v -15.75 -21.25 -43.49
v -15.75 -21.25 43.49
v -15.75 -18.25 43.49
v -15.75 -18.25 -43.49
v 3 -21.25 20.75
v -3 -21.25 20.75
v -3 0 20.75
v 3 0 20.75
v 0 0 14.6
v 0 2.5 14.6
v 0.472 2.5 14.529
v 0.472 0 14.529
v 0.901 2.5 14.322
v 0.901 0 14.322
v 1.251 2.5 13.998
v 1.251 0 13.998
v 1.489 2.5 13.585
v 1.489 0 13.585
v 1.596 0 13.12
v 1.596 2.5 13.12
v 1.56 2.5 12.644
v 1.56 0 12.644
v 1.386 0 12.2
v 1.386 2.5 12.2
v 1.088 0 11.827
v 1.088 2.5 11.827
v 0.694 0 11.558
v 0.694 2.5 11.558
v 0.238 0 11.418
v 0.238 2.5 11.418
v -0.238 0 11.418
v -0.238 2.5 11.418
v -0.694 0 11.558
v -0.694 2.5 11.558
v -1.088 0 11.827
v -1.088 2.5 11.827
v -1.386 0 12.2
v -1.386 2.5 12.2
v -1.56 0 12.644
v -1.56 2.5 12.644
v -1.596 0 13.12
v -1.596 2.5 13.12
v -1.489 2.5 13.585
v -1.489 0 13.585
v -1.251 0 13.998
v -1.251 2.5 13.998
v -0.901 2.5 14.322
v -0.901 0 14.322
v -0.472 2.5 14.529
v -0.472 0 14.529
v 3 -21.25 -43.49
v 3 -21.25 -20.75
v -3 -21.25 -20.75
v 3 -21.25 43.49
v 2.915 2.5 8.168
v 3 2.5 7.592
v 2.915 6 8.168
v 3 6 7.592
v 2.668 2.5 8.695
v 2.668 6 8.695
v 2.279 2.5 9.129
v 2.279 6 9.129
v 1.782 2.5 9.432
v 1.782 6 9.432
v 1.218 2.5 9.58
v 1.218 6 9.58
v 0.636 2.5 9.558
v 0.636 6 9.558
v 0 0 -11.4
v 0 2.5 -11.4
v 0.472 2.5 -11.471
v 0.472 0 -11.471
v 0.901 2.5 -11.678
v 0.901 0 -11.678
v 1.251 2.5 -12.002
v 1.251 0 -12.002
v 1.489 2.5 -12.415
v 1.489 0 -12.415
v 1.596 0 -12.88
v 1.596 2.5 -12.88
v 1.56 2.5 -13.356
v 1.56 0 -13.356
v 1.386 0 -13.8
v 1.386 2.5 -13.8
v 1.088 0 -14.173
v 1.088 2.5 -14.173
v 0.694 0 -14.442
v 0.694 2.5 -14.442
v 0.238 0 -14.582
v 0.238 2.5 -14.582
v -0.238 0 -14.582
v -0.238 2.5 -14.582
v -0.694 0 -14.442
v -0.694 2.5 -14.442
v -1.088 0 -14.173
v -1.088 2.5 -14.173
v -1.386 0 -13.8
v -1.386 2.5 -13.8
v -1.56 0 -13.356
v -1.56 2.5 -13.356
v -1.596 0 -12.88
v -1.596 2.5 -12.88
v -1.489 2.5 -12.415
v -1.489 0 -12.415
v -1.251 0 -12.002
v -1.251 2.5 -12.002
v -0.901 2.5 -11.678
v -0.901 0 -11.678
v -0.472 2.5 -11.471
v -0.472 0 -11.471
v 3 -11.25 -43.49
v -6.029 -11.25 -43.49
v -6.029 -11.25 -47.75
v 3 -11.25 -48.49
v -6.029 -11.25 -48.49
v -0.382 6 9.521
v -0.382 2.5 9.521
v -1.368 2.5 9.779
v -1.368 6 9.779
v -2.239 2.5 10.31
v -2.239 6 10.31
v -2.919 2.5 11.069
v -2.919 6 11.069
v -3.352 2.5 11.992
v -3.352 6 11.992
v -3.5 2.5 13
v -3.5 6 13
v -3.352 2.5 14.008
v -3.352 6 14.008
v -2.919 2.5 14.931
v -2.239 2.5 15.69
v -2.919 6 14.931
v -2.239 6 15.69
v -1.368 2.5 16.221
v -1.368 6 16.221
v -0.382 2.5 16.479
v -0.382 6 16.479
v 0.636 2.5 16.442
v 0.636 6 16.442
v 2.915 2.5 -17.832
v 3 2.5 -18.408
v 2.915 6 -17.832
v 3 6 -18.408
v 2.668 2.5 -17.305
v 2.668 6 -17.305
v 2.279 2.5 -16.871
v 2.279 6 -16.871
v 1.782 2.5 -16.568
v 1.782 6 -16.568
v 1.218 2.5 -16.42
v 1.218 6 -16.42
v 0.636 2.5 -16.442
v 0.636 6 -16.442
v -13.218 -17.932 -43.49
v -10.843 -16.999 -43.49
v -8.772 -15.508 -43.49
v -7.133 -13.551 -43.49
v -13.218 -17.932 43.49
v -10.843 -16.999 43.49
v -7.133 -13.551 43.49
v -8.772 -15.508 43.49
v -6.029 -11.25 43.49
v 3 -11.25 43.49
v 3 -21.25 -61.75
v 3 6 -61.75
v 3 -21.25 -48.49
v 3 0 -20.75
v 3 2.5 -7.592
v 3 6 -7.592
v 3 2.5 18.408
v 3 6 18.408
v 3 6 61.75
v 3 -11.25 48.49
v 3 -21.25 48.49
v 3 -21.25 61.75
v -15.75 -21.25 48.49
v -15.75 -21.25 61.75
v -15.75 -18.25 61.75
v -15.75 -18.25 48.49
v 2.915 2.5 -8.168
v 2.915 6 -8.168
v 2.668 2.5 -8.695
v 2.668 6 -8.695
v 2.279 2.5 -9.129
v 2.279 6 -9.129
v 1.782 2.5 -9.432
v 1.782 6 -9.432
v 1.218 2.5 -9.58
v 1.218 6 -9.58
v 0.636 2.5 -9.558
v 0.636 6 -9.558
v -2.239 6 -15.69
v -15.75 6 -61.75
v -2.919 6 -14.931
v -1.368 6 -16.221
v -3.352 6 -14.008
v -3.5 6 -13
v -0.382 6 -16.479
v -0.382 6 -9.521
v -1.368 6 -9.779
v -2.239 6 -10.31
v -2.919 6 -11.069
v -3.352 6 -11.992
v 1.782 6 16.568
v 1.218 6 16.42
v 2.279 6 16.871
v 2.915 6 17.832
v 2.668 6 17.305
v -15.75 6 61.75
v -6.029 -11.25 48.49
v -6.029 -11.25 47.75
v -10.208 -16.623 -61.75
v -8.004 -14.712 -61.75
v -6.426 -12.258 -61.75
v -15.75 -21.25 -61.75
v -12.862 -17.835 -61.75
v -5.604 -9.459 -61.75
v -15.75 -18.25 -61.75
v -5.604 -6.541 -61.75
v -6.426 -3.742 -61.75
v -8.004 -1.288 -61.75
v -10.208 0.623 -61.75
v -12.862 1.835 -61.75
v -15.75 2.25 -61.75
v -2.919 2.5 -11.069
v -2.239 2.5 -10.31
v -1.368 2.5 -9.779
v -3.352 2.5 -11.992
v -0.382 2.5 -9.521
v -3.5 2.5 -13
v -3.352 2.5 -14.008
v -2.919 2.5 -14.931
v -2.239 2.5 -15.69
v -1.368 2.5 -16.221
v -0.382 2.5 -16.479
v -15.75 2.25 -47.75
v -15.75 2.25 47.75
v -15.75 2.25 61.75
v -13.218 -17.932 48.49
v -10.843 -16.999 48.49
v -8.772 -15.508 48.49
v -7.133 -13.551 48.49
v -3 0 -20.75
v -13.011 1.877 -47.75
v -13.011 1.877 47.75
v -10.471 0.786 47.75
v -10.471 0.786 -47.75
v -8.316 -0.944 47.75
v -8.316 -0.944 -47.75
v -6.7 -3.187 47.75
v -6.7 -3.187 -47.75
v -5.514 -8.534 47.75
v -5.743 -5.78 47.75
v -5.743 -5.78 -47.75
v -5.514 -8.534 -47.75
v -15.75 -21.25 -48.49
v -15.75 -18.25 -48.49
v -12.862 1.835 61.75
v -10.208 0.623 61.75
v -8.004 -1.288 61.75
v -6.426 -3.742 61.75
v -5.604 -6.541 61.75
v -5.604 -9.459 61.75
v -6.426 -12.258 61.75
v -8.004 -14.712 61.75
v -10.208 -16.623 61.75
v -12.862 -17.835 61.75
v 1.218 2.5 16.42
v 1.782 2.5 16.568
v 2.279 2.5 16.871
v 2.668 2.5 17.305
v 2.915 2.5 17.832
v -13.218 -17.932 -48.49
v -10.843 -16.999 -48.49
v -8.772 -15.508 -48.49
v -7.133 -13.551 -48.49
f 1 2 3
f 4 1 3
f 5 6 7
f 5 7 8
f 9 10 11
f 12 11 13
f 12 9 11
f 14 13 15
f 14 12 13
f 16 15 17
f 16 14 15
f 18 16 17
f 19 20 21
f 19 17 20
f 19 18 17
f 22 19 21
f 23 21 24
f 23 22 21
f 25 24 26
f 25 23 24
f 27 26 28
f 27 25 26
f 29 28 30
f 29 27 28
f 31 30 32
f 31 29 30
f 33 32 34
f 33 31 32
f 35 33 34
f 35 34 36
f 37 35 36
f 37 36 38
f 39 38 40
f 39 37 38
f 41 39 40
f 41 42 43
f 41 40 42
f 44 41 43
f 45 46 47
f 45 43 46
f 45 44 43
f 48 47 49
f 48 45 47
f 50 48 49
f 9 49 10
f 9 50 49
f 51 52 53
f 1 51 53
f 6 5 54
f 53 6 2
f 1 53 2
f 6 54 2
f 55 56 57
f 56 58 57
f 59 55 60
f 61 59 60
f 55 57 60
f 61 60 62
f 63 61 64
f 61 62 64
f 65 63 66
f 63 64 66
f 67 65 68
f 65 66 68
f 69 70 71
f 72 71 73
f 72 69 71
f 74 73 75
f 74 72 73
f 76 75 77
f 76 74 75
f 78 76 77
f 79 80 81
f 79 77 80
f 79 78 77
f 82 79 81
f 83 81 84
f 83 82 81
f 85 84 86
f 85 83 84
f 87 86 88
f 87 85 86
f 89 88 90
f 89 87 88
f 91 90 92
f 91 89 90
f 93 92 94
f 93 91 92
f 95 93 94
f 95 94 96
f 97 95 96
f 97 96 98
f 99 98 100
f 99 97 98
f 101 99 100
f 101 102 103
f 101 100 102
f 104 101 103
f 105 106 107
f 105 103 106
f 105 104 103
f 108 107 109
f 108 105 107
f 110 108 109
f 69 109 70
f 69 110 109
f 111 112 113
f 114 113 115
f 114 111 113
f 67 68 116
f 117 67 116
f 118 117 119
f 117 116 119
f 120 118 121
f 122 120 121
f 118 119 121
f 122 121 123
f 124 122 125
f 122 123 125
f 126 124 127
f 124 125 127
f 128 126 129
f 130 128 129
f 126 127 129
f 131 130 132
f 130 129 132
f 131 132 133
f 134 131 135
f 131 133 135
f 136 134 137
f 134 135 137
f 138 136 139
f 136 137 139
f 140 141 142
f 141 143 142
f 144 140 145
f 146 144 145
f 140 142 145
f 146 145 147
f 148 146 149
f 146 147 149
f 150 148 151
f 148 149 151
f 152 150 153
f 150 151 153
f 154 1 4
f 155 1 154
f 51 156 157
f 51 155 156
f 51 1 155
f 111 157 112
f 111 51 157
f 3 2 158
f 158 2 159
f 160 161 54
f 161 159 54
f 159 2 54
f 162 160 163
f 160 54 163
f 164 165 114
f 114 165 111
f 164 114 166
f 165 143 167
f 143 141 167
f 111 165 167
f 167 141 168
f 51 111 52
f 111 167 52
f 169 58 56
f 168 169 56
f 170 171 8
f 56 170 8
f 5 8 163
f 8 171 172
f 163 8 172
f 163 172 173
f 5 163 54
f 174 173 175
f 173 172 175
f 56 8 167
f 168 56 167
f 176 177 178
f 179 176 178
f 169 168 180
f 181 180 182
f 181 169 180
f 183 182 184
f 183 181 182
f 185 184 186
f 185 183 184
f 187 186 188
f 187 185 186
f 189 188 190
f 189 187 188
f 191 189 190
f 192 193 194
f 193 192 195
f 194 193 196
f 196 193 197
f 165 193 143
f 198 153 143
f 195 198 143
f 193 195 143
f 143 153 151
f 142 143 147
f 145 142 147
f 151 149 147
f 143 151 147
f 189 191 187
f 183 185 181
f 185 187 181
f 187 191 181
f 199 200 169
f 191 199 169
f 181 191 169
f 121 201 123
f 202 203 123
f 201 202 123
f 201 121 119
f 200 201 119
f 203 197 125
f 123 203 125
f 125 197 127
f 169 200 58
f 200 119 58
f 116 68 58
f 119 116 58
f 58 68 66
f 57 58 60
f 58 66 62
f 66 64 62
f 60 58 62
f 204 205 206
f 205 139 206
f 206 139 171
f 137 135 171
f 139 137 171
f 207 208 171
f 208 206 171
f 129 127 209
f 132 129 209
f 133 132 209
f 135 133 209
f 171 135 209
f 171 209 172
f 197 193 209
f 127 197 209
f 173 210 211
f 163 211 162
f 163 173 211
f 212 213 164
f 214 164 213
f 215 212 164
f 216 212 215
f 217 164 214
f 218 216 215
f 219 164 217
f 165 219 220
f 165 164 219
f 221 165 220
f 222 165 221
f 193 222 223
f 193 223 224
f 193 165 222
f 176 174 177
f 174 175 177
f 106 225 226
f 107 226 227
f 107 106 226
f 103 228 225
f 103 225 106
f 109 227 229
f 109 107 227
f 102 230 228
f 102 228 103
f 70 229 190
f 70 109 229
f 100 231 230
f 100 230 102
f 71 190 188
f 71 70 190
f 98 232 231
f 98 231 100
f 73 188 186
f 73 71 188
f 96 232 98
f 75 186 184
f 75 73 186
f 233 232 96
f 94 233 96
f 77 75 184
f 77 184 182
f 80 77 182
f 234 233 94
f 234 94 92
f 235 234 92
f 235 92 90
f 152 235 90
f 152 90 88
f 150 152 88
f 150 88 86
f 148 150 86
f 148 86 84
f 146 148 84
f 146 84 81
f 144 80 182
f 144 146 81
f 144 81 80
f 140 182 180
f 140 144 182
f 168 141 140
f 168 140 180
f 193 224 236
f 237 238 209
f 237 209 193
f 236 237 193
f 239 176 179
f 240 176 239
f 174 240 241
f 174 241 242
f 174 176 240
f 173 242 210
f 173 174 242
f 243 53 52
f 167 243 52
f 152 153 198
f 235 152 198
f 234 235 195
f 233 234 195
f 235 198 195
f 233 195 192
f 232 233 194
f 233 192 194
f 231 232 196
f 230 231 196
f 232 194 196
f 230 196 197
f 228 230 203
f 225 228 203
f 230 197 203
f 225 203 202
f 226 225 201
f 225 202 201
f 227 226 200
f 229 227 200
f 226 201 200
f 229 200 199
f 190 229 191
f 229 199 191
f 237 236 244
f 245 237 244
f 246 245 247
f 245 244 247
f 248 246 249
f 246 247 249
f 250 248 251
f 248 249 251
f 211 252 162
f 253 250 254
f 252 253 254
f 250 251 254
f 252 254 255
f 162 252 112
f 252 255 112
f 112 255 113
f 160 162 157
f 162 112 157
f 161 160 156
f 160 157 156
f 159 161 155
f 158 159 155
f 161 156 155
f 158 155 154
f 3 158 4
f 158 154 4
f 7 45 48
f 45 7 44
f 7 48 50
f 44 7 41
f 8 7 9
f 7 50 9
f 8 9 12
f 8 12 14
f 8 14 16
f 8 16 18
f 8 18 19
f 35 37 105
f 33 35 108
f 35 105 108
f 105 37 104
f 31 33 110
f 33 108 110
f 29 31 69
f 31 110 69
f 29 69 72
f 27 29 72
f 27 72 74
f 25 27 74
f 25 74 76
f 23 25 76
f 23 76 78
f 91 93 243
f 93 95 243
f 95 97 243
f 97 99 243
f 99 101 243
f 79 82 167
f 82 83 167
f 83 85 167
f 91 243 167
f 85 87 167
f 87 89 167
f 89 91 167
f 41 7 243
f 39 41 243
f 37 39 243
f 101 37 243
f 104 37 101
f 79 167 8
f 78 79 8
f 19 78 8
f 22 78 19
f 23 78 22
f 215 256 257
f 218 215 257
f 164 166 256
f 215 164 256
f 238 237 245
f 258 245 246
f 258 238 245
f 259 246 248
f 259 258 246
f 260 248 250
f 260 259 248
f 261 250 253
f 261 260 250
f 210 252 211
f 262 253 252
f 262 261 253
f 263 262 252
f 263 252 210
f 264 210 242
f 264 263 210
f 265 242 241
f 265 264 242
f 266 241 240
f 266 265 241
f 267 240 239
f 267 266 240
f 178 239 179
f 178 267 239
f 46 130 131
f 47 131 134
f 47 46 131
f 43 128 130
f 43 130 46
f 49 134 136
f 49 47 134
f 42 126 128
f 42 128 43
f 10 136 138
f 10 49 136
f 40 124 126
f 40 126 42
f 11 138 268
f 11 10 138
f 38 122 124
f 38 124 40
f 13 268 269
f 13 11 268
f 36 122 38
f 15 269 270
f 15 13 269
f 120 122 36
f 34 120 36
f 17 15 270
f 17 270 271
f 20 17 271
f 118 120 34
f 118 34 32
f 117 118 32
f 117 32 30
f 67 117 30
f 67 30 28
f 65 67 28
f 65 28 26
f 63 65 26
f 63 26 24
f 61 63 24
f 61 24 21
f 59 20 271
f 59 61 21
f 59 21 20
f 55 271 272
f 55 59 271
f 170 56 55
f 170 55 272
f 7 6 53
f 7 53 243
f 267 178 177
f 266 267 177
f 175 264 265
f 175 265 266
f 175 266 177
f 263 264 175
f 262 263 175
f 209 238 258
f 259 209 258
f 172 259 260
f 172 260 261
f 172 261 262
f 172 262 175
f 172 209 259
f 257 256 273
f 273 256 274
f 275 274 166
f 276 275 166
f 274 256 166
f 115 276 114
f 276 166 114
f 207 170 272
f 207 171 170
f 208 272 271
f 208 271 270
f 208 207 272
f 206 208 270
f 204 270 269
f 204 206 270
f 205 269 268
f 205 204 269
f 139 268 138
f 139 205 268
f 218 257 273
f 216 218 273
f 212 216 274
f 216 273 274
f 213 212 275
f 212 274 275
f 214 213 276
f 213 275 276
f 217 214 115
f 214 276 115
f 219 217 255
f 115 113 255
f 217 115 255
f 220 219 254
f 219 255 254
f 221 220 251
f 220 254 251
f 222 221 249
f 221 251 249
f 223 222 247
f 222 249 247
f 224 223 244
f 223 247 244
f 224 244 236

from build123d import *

# Parameters (mm, degrees)
SKETCH_1_W          = 6
SKETCH_1_H          = 41.5
SKETCH_1_R          = 1.6
EXTRUDE_1_DEPTH     = 3
EXTRUDE_2_DEPTH     = 41.5
EXTRUDE_START       = 17
EXTRUDE_3_DEPTH     = 17
EXTRUDE_START_2     = 10
EXTRUDE_4_DEPTH     = 10
SKETCH_6_W          = 18.75
SKETCH_6_H          = 95.5
SKETCH_6_R          = 1.6
EXTRUDE_5_DEPTH     = 3
EXTRUDE_START_3     = 75.5
EXTRUDE_6_DEPTH     = 75.5
SKETCH_8_W          = 6
SKETCH_8_H          = 41.5
CUT_EXTRUDE_1_DEPTH = 53.193150892
SKETCH_9_R          = 3.5
CUT_EXTRUDE_2_DEPTH = 3.5
FILLET_1_R          = 2
EXTRUDE_START_4     = 14
EXTRUDE_7_DEPTH     = 14
EXTRUDE_8_DEPTH     = 14
SKETCH_12_W         = 5
SKETCH_12_H         = 10
CUT_EXTRUDE_3_DEPTH = 68.942530862


with BuildPart() as part:
    # 草图1 → 凸台-拉伸1 (new body)
    with BuildSketch(Plane(origin=(0, 0, 0), x_dir=(1, 0, 0), z_dir=(0, 1, 0))):
        Rectangle(SKETCH_1_W, SKETCH_1_H)
        with Locations(Location((0, 13, 0), (0, 0, 270))):
            Circle(SKETCH_1_R, mode=Mode.SUBTRACT)
        with Locations(Location((0, -13, 0), (0, 0, 270))):
            Circle(SKETCH_1_R, mode=Mode.SUBTRACT)
    extrude(amount=EXTRUDE_1_DEPTH)

    # 草图2 → 凸台-拉伸2 (add)
    with BuildSketch(Plane.XY.offset(20.75)):
        with BuildLine():
            ThreePointArc((-5.5, -8), (-8.502155493, -0.752155493), (-15.75, 2.25))
            Line((-15.75, 2.25), (-15.75, 3))
            Line((-15.75, 3), (-5.5, 3))
            Line((-5.5, 3), (-5.5, -8))
        make_face()
        Polygon((-5.5, 3), (-5.5, -8), (-3, -8), (-3, 0), (-3, 3), align=None)
    extrude(amount=-EXTRUDE_2_DEPTH)

    # 草图4 → 凸台-拉伸3 (add)
    with BuildSketch(Plane.XY.offset(20.75).offset(EXTRUDE_START)):
        with BuildLine():
            Line((3, -8), (3, 3))
            Line((3, 3), (-15.75, 3))
            Line((-15.75, 3), (-15.75, 2.25))
            ThreePointArc((-15.75, 2.25), (-8.502155493, -0.752155493), (-5.5, -8))
            Line((-5.5, -8), (3, -8))
        make_face()
    extrude_3 = extrude(amount=-EXTRUDE_3_DEPTH)

    # 草图5 → 凸台-拉伸4 (add)
    with BuildSketch(Plane.XY.offset(37.75).offset(EXTRUDE_START_2)):
        with BuildLine():
            Line((-15.75, -18.25), (-15.75, -21.25))
            Line((-15.75, -21.25), (3, -21.25))
            Line((3, -21.25), (3, 3))
            Line((3, 3), (-15.75, 3))
            Line((-15.75, 3), (-15.75, 2.25))
            ThreePointArc((-15.75, 2.25), (-5.5, -8), (-15.75, -18.25))
        make_face()
    extrude_4 = extrude(amount=-EXTRUDE_4_DEPTH)

    # 镜向1: 凸台-拉伸3, 凸台-拉伸4 across plane
    add(extrude_3.mirror(Plane.XY))
    add(extrude_4.mirror(Plane.XY))

    # 草图6 → 凸台-拉伸5 (add)
    with BuildSketch(Plane(origin=(0, 3, 0), x_dir=(1, 0, 0), z_dir=(0, 1, 0))):
        with Locations((-6.375, 0)):
            Rectangle(SKETCH_6_W, SKETCH_6_H)
        with Locations(Location((0, -13, 0), (0, 0, 270))):
            Circle(SKETCH_6_R, mode=Mode.SUBTRACT)
        with Locations(Location((0, 13, 0), (0, 0, 270))):
            Circle(SKETCH_6_R, mode=Mode.SUBTRACT)
    extrude(amount=EXTRUDE_5_DEPTH)

    # 草图7 → 凸台-拉伸6 (add)
    with BuildSketch(Plane.XY.offset(-37.75).offset(EXTRUDE_START_3)):
        with BuildLine():
            Line((3, -8), (-5.5, -8))
            ThreePointArc((-5.5, -8), (-8.502155493, -15.247844507), (-15.75, -18.25))
            Line((-15.75, -18.25), (-15.75, -21.25))
            Line((-15.75, -21.25), (3, -21.25))
            Line((3, -21.25), (3, -8))
        make_face()
    extrude(amount=-EXTRUDE_6_DEPTH)

    # 草图8 → 切除-拉伸1 (cut, through all)
    with BuildSketch(Plane(origin=(0, -8, 0), x_dir=(1, 0, 0), z_dir=(0, 1, 0))):
        Rectangle(SKETCH_8_W, SKETCH_8_H)
    extrude(amount=-CUT_EXTRUDE_1_DEPTH, mode=Mode.SUBTRACT)

    # 草图9 → 切除-拉伸2 (cut)
    with BuildSketch(Plane(origin=(0, 6, 0), x_dir=(1, 0, 0), z_dir=(0, 1, 0))):
        with Locations((0, 13)):
            Circle(SKETCH_9_R)
        with Locations((0, -13)):
            Circle(SKETCH_9_R)
    extrude(amount=-CUT_EXTRUDE_2_DEPTH, mode=Mode.SUBTRACT)

    # 圆角1
    fillet_1_edges = [part.edges().sort_by_distance(p)[0] for p in [
        (3, 4.25, -11.197224362),
        (3, 4.25, -14.802775638),
        (3, 4.25, 14.802775638),
        (3, 4.25, 11.197224362),
    ]]
    fillet(fillet_1_edges, radius=FILLET_1_R)

    # 草图10 → 凸台-拉伸7 (add)
    with BuildSketch(Plane.XY.offset(47.75).offset(EXTRUDE_START_4)):
        with BuildLine():
            Line((-15.75, -18.25), (-15.75, -21.25))
            Line((-15.75, -21.25), (3, -21.25))
            Line((3, -21.25), (3, 6))
            Line((3, 6), (-15.75, 6))
            Line((-15.75, 6), (-15.75, 2.25))
            ThreePointArc((-15.75, 2.25), (-5.5, -8), (-15.75, -18.25))
        make_face()
    extrude(amount=-EXTRUDE_7_DEPTH)

    # 草图11 → 凸台-拉伸8 (add)
    with BuildSketch(Plane(origin=(0, 0, -47.75), x_dir=(-1, 0, 0), z_dir=(0, 0, -1))):
        with BuildLine():
            Line((15.75, 2.25), (15.75, 6))
            Line((15.75, 6), (-3, 6))
            Line((-3, 6), (-3, -21.25))
            Line((-3, -21.25), (15.75, -21.25))
            Line((15.75, -21.25), (15.75, -18.25))
            ThreePointArc((15.75, -18.25), (5.5, -8), (15.75, 2.25))
        make_face()
    extrude(amount=EXTRUDE_8_DEPTH)

    # 草图12 → 切除-拉伸3 (cut, through all)
    with BuildSketch(Plane(origin=(3, 0, 0), x_dir=(0, 0, -1), z_dir=(1, 0, 0))):
        with Locations((45.99, -16.25)):
            Rectangle(SKETCH_12_W, SKETCH_12_H)
        with Locations((-45.99, -16.25)):
            Rectangle(SKETCH_12_W, SKETCH_12_H)
    extrude(amount=-CUT_EXTRUDE_3_DEPTH, mode=Mode.SUBTRACT)


solid = part.part
